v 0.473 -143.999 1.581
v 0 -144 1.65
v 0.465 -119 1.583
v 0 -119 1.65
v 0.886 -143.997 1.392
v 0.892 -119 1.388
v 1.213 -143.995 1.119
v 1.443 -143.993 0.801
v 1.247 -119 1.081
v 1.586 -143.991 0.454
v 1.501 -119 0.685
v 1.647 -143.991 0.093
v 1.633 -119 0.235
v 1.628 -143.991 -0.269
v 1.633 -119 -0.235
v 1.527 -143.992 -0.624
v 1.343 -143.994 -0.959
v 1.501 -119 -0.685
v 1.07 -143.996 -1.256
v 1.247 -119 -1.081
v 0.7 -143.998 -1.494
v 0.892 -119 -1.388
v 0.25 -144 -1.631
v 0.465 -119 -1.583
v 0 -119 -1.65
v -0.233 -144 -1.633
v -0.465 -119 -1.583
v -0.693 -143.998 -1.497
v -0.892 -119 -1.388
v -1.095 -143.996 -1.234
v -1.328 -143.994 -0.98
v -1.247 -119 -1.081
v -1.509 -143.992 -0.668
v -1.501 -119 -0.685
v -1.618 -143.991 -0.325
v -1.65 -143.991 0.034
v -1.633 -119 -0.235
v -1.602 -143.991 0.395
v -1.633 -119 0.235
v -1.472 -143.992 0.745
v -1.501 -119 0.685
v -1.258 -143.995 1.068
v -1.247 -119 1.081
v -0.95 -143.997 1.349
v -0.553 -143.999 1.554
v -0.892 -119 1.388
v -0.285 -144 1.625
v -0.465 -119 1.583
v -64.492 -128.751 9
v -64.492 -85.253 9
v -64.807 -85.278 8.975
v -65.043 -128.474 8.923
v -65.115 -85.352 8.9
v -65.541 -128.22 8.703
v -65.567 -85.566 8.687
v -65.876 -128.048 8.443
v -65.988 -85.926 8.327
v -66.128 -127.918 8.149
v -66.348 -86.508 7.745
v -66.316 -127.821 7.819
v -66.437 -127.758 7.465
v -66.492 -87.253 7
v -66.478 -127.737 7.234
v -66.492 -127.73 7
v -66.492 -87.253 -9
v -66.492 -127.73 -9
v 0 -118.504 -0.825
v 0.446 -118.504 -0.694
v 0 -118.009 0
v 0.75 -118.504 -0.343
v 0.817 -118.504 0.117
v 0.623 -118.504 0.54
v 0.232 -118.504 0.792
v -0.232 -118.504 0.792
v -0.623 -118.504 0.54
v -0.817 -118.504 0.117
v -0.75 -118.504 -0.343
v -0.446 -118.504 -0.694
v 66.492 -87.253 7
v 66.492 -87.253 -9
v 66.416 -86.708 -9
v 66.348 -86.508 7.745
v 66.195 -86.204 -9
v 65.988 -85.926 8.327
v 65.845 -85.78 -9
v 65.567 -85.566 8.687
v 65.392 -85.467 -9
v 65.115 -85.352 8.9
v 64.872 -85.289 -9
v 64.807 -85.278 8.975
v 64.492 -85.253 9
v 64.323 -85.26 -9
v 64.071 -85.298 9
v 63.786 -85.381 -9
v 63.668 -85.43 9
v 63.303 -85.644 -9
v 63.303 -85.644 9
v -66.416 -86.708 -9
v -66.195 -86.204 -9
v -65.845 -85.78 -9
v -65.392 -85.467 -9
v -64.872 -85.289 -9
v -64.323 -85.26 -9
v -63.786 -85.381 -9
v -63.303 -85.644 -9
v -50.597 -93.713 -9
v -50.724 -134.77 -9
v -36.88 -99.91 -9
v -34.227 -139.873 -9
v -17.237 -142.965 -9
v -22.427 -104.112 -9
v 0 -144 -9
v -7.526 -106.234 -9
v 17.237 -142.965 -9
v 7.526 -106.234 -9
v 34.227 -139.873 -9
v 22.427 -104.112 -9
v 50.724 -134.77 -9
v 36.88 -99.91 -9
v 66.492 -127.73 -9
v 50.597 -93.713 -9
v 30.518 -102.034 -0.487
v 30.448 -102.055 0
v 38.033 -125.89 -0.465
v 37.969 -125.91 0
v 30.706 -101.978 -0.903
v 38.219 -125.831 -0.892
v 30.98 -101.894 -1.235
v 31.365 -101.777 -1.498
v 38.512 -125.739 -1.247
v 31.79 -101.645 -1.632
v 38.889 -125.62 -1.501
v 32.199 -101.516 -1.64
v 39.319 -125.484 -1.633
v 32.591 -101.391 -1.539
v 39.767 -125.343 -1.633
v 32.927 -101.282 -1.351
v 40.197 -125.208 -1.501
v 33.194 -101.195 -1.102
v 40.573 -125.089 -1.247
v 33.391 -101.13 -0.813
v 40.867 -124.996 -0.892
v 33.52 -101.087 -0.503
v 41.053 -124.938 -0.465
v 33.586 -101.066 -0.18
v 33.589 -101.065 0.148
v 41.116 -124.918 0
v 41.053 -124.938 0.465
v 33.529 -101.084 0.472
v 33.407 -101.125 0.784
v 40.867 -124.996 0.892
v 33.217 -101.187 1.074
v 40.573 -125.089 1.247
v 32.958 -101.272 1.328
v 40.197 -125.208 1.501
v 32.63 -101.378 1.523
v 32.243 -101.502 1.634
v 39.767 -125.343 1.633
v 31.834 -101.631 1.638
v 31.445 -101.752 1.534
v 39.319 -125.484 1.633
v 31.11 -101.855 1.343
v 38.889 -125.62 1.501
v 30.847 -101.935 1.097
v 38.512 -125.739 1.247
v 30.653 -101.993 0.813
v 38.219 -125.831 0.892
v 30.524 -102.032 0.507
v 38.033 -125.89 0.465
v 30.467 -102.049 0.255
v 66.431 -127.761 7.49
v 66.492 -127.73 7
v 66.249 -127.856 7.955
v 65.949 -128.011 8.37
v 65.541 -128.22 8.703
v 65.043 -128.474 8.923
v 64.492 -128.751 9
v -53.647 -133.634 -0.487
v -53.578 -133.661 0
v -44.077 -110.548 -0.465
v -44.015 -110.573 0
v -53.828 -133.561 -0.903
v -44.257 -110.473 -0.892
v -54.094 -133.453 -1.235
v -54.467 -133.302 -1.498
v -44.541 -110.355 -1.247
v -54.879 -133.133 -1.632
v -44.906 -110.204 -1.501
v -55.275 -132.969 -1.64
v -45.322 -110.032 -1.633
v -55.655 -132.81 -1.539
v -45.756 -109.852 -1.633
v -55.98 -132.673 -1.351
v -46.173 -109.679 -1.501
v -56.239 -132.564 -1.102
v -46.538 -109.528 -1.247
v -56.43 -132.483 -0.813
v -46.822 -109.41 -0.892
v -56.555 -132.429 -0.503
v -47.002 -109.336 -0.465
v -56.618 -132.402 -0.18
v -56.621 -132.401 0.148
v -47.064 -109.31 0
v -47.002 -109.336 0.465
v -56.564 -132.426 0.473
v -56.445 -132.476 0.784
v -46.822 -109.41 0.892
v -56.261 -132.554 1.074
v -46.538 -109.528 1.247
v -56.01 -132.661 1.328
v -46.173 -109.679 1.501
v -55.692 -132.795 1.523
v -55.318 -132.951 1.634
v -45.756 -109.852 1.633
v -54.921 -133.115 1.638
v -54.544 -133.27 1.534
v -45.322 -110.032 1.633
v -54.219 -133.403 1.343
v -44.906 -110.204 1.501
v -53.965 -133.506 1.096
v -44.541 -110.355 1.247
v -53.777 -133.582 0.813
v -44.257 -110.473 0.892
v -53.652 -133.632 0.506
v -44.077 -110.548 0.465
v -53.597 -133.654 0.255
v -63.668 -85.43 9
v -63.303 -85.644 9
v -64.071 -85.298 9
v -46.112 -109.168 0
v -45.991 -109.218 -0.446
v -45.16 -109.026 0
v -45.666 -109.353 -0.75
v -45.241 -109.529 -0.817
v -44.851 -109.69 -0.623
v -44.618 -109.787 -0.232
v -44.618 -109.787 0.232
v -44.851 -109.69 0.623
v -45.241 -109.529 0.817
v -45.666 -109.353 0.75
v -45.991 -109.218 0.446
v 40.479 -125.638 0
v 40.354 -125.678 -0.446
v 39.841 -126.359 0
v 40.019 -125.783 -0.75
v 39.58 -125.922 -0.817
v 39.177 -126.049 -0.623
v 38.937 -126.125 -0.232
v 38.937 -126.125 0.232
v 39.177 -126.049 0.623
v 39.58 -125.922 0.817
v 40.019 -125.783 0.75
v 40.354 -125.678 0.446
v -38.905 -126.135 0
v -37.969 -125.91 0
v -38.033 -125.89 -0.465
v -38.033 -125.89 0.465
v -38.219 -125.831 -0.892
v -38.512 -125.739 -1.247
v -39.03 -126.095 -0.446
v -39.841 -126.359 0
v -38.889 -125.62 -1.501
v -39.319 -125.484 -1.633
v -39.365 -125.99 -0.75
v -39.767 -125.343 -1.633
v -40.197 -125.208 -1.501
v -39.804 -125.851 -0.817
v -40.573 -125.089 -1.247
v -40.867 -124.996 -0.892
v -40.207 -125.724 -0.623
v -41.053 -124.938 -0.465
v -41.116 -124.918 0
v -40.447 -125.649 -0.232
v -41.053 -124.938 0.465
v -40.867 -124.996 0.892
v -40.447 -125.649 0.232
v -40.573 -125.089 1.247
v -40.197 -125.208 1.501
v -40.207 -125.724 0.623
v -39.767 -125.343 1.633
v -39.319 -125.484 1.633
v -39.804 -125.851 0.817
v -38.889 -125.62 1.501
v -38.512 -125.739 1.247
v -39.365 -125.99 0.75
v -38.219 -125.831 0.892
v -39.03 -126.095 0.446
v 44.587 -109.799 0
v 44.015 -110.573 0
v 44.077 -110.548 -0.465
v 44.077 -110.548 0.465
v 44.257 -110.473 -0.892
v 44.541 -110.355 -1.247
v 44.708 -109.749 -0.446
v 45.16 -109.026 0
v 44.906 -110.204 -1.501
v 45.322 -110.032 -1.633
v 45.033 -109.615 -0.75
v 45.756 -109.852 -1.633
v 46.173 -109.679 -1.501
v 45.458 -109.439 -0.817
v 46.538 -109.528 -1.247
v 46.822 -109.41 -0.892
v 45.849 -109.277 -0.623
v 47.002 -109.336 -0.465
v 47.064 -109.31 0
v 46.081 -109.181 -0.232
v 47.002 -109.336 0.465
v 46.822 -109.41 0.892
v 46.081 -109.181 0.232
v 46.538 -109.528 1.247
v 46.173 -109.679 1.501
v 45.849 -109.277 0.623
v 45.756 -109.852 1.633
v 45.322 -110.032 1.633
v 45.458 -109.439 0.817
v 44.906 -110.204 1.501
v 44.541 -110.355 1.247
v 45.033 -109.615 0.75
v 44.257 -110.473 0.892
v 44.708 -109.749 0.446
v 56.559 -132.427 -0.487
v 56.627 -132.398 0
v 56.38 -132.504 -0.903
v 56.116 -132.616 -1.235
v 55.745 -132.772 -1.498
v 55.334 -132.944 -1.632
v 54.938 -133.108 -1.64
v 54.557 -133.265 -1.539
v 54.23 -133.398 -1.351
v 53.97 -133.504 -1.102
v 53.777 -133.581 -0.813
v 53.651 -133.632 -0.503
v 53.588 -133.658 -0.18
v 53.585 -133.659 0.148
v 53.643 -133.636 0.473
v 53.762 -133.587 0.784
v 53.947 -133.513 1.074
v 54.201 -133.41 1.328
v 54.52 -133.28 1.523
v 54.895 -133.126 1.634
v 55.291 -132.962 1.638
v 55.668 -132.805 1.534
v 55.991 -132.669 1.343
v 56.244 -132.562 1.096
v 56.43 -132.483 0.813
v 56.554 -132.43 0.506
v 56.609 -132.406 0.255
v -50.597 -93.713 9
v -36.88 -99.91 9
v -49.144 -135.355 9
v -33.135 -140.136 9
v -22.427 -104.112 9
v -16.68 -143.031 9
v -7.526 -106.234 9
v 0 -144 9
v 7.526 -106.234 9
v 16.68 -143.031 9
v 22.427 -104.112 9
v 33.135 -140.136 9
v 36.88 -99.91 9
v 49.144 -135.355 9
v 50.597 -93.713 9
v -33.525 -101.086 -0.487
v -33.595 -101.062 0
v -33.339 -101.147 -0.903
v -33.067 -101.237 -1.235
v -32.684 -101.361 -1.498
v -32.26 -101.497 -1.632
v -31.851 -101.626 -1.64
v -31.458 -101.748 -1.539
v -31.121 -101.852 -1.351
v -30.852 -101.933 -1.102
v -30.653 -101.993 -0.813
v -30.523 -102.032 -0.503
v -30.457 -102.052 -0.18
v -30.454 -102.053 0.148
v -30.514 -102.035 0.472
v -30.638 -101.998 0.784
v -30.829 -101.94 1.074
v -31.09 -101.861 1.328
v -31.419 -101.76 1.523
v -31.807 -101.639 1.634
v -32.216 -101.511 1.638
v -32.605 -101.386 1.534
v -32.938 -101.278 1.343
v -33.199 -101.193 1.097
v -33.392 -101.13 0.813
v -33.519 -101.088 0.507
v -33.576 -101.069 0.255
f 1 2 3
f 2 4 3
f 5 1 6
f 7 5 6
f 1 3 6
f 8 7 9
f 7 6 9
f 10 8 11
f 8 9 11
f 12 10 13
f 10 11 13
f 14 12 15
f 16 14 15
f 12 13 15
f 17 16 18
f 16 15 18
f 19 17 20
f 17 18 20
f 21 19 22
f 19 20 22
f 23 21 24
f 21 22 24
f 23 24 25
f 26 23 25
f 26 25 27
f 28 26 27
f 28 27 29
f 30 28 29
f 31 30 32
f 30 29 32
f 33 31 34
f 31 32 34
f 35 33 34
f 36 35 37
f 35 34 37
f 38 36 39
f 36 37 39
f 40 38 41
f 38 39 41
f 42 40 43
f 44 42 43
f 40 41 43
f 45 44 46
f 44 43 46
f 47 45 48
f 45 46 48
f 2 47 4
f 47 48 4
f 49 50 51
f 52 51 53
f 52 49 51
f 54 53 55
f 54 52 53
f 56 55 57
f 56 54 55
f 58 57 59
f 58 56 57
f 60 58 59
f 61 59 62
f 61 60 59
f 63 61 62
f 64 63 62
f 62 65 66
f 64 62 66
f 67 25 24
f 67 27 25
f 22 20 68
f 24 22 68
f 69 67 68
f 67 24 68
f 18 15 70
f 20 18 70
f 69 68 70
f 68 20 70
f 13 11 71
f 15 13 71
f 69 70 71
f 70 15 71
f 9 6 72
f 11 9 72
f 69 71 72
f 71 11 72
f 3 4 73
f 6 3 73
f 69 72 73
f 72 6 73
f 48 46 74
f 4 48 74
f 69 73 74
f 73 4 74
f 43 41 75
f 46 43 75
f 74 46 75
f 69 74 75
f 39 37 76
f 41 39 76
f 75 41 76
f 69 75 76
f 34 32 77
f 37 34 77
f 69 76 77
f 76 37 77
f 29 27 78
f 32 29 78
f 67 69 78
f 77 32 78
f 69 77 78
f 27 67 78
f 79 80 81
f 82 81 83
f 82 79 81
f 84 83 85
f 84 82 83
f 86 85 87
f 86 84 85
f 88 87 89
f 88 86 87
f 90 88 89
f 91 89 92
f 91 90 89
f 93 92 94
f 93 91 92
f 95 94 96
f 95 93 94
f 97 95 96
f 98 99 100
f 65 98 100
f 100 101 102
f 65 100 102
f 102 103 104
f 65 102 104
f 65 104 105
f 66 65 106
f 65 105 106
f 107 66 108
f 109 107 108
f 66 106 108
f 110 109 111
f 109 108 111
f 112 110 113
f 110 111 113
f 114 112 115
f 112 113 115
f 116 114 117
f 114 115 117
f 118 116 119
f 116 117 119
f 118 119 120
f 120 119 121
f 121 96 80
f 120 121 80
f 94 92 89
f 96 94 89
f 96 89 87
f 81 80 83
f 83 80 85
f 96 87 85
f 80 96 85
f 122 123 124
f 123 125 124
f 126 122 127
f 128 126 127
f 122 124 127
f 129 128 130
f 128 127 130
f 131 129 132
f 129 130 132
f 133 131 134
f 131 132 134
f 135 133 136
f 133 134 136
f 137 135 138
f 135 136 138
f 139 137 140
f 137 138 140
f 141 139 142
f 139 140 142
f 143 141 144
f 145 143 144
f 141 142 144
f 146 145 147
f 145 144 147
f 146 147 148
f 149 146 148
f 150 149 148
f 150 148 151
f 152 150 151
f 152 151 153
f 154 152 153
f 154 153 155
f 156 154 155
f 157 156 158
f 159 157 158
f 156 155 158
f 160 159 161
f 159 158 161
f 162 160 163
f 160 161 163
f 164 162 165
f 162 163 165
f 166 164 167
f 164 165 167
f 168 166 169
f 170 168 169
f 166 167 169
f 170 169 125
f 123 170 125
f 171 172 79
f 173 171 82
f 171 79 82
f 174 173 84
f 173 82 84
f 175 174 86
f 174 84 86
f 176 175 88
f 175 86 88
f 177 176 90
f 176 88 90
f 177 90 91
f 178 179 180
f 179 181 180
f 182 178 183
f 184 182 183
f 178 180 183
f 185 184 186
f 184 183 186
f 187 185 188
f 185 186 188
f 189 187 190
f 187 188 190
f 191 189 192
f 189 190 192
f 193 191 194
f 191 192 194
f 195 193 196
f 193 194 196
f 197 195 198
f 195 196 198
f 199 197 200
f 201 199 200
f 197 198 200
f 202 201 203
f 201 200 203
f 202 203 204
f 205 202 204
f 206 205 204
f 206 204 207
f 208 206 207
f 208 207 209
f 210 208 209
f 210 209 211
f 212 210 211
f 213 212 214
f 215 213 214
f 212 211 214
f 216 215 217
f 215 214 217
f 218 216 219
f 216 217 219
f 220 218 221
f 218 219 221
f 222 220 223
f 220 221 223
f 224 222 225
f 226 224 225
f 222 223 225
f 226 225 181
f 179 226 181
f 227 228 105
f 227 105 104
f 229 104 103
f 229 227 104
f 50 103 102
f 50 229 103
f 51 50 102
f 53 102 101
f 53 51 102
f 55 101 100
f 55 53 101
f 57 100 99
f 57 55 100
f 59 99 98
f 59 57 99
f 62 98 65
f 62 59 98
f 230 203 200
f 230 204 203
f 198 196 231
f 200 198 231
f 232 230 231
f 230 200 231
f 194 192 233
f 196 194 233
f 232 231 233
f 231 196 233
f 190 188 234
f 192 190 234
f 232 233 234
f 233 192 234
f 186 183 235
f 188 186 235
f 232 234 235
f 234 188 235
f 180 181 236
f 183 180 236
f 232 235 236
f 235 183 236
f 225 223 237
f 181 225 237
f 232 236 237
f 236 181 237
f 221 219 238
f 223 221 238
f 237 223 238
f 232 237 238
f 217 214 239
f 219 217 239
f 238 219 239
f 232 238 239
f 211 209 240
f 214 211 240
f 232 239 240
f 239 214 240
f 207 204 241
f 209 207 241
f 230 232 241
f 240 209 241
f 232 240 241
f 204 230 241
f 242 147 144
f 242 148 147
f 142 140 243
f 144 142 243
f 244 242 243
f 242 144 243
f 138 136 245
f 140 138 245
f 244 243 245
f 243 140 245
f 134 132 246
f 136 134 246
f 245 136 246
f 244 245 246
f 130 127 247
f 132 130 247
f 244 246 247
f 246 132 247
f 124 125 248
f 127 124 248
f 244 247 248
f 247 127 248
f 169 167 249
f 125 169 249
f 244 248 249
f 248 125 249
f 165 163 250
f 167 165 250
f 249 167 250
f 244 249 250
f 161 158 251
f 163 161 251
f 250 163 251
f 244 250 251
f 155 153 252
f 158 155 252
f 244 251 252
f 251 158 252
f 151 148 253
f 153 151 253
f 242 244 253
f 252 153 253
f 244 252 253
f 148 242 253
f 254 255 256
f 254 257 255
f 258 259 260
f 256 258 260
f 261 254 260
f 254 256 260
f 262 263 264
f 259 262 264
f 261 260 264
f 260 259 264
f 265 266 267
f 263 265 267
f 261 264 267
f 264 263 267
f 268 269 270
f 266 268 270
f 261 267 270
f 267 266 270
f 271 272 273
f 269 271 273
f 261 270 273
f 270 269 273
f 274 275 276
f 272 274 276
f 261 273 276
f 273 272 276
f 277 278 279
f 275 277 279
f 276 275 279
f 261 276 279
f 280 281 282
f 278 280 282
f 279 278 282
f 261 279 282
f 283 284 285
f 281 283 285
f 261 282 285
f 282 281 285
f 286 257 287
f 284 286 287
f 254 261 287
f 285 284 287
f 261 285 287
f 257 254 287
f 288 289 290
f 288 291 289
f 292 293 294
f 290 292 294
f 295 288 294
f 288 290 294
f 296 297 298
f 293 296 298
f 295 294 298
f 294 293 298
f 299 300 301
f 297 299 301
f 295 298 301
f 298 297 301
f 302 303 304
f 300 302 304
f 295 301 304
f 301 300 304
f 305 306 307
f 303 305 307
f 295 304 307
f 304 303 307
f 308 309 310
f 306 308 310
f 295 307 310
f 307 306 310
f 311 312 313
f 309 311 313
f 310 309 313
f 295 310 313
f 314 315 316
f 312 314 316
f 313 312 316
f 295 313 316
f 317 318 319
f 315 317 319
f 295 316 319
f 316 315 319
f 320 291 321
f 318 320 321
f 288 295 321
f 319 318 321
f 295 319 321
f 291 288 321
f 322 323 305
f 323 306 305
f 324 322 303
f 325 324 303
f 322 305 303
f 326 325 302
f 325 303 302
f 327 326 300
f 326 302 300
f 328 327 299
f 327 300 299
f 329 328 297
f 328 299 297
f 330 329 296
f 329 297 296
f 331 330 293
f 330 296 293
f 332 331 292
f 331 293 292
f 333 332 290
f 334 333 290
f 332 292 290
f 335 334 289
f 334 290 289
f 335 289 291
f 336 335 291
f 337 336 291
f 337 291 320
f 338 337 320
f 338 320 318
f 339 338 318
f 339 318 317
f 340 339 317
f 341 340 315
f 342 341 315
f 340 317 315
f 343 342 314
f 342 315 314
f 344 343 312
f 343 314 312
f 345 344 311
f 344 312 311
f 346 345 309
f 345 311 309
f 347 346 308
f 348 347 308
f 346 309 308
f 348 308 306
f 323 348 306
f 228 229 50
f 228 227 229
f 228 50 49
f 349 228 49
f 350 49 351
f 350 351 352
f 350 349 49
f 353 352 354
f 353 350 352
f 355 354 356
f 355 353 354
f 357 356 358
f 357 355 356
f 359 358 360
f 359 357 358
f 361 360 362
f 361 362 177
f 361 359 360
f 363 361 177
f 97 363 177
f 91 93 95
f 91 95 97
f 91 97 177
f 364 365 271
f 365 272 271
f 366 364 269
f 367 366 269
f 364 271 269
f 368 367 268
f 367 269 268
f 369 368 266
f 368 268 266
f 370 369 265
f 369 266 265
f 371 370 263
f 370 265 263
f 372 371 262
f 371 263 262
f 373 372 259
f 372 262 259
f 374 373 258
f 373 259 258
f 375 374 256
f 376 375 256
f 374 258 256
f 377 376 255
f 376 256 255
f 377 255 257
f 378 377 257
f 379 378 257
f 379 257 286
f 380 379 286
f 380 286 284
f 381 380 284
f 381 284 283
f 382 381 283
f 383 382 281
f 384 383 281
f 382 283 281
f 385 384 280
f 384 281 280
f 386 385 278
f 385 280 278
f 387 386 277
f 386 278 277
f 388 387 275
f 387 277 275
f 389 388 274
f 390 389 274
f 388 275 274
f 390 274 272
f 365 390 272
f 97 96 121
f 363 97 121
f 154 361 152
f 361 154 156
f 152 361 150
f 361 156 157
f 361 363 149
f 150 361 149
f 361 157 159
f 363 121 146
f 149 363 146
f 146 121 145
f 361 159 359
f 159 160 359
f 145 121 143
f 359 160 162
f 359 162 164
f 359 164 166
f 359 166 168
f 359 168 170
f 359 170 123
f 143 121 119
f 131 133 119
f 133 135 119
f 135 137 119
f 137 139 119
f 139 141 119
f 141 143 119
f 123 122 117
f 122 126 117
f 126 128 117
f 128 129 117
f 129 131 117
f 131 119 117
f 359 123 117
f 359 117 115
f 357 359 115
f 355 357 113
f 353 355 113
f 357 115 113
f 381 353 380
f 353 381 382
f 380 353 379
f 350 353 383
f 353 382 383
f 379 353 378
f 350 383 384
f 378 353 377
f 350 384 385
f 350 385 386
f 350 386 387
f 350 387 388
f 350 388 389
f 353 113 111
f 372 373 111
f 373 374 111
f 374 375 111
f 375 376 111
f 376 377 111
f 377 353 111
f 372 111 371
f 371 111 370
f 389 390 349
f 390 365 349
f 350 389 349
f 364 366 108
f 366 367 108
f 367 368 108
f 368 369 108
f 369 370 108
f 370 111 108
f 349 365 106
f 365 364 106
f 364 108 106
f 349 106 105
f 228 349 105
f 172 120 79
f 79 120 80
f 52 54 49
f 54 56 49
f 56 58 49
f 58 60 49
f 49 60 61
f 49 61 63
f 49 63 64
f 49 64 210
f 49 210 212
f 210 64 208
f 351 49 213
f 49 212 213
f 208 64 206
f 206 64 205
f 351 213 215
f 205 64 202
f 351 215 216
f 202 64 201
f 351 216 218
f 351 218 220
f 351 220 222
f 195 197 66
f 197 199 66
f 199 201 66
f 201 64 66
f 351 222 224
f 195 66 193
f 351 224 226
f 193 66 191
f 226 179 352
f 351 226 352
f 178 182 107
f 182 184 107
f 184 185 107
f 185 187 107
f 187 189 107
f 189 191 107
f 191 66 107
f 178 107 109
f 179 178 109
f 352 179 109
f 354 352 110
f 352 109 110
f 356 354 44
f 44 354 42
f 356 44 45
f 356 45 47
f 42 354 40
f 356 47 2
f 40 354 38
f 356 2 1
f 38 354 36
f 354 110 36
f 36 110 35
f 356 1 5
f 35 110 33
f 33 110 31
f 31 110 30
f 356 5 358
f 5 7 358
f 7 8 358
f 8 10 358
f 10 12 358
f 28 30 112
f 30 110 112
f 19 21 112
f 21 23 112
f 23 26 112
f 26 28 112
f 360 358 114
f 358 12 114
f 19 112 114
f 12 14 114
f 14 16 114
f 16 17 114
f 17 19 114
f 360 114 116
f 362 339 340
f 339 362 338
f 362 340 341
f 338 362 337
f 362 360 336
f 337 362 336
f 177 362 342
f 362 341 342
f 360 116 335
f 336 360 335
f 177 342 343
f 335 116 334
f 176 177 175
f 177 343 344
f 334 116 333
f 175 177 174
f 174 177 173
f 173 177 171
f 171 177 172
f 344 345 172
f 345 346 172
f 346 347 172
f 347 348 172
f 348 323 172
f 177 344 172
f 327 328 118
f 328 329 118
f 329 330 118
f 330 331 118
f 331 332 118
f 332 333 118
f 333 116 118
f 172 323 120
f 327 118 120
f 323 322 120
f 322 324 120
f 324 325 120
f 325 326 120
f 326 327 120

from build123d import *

# Parameters (mm, degrees)
BOSS_EXTRUDE1_DEPTH                   = 9
BOSS_EXTRUDE1_DEPTH_BACK              = 9
TAP_DRILL_FOR_M4_TAP1_D               = 3.3
TAP_DRILL_FOR_M4_TAP1_DEPTH           = 25
TAP_DRILL_FOR_M4_TAP1_TIP             = 0.991420021
TAP_DRILL_FOR_M4_TAP1_ON_FACE_2_D     = 3.3
TAP_DRILL_FOR_M4_TAP1_ON_FACE_2_DEPTH = 25
TAP_DRILL_FOR_M4_TAP1_ON_FACE_2_TIP   = 0.991420021
TAP_DRILL_FOR_M4_TAP1_ON_FACE_3_D     = 3.3
TAP_DRILL_FOR_M4_TAP1_ON_FACE_3_DEPTH = 25
TAP_DRILL_FOR_M4_TAP1_ON_FACE_3_TIP   = 0.991420021
TAP_DRILL_FOR_M4_TAP1_ON_FACE_4_D     = 3.3
TAP_DRILL_FOR_M4_TAP1_ON_FACE_4_DEPTH = 25
TAP_DRILL_FOR_M4_TAP1_ON_FACE_4_TIP   = 0.991420021
TAP_DRILL_FOR_M4_TAP1_ON_FACE_5_D     = 3.3
TAP_DRILL_FOR_M4_TAP1_ON_FACE_5_DEPTH = 25
TAP_DRILL_FOR_M4_TAP1_ON_FACE_5_TIP   = 0.991420021
FILLET2_R                             = 2


with BuildPart() as part:
    # Sketch1 → Boss-Extrude1 (new, two sides: drawn at the far end of the back side and taken through both)
    with BuildSketch(Plane.XY.offset(-BOSS_EXTRUDE1_DEPTH_BACK)):
        with BuildLine():
            Line((66.491800306, -127.729559978), (66.491800306, -83.193091613))
            ThreePointArc((66.491800306, -83.193091613), (0, -106.5), (-66.491800306, -83.193091613))
            Line((-66.491800306, -83.193091613), (-66.491800306, -127.729559978))
            ThreePointArc((-66.491800306, -127.729559978), (0, -144), (66.491800306, -127.729559978))
        make_face()
    extrude(amount=BOSS_EXTRUDE1_DEPTH + BOSS_EXTRUDE1_DEPTH_BACK)

    # Tap Drill for M4 Tap1
    with Locations(Plane(origin=(-32.025167647, -101.570855255, 0), x_dir=(0.953716950748, -0.300705799504, 0), z_dir=(0.300705799504, 0.953716950748, 0))):
        with Locations((0, 0)):
            Hole(TAP_DRILL_FOR_M4_TAP1_D / 2, depth=TAP_DRILL_FOR_M4_TAP1_DEPTH)
            with Locations((0, 0, -(TAP_DRILL_FOR_M4_TAP1_DEPTH + TAP_DRILL_FOR_M4_TAP1_TIP / 2))):  # 118° drill point
                Cone(0, TAP_DRILL_FOR_M4_TAP1_D / 2, TAP_DRILL_FOR_M4_TAP1_TIP, mode=Mode.SUBTRACT)

    # Tap Drill for M4 Tap1 on face 2
    with Locations(Plane(origin=(32.025167647, -101.570855255, 0), x_dir=(0.953716897702, 0.300705967746, 0), z_dir=(-0.300705967746, 0.953716897702, 0))):
        with Locations((0, 0)):
            Hole(TAP_DRILL_FOR_M4_TAP1_ON_FACE_2_D / 2, depth=TAP_DRILL_FOR_M4_TAP1_ON_FACE_2_DEPTH)
            with Locations((0, 0, -(TAP_DRILL_FOR_M4_TAP1_ON_FACE_2_DEPTH + TAP_DRILL_FOR_M4_TAP1_ON_FACE_2_TIP / 2))):  # 118° drill point
                Cone(0, TAP_DRILL_FOR_M4_TAP1_ON_FACE_2_D / 2, TAP_DRILL_FOR_M4_TAP1_ON_FACE_2_TIP, mode=Mode.SUBTRACT)

    # Tap Drill for M4 Tap1 on face 3
    with Locations(Plane(origin=(-55.106414261, -133.038652682, 0), x_dir=(-0.923879753837, 0.382682898036, 0), z_dir=(-0.382682898036, -0.923879753837, 0))):
        with Locations((0, 0)):
            Hole(TAP_DRILL_FOR_M4_TAP1_ON_FACE_3_D / 2, depth=TAP_DRILL_FOR_M4_TAP1_ON_FACE_3_DEPTH)
            with Locations((0, 0, -(TAP_DRILL_FOR_M4_TAP1_ON_FACE_3_DEPTH + TAP_DRILL_FOR_M4_TAP1_ON_FACE_3_TIP / 2))):  # 118° drill point
                Cone(0, TAP_DRILL_FOR_M4_TAP1_ON_FACE_3_D / 2, TAP_DRILL_FOR_M4_TAP1_ON_FACE_3_TIP, mode=Mode.SUBTRACT)

    # Tap Drill for M4 Tap1 on face 4
    with Locations(Plane(origin=(0, -144, 0), x_dir=(0, 0, -1), z_dir=(0, -1, 0))):
        with Locations((0, 0)):
            Hole(TAP_DRILL_FOR_M4_TAP1_ON_FACE_4_D / 2, depth=TAP_DRILL_FOR_M4_TAP1_ON_FACE_4_DEPTH)
            with Locations((0, 0, -(TAP_DRILL_FOR_M4_TAP1_ON_FACE_4_DEPTH + TAP_DRILL_FOR_M4_TAP1_ON_FACE_4_TIP / 2))):  # 118° drill point
                Cone(0, TAP_DRILL_FOR_M4_TAP1_ON_FACE_4_D / 2, TAP_DRILL_FOR_M4_TAP1_ON_FACE_4_TIP, mode=Mode.SUBTRACT)

    # Tap Drill for M4 Tap1 on face 5
    with Locations(Plane(origin=(55.106414261, -133.038652682, 0), x_dir=(-0.923879753837, -0.382682898036, 0), z_dir=(0.382682898036, -0.923879753837, 0))):
        with Locations((0, 0)):
            Hole(TAP_DRILL_FOR_M4_TAP1_ON_FACE_5_D / 2, depth=TAP_DRILL_FOR_M4_TAP1_ON_FACE_5_DEPTH)
            with Locations((0, 0, -(TAP_DRILL_FOR_M4_TAP1_ON_FACE_5_DEPTH + TAP_DRILL_FOR_M4_TAP1_ON_FACE_5_TIP / 2))):  # 118° drill point
                Cone(0, TAP_DRILL_FOR_M4_TAP1_ON_FACE_5_D / 2, TAP_DRILL_FOR_M4_TAP1_ON_FACE_5_TIP, mode=Mode.SUBTRACT)

    # Fillet2
    fillet2_edges = [part.edges().sort_by_distance(p)[0] for p in [
        (-66.491800306, -105.461325795, 9),
        (66.491800306, -105.461325795, 9),
        (66.491800306, -83.193091613, 0),
        (-66.491800306, -83.193091613, 0),
    ]]
    fillet(fillet2_edges, radius=FILLET2_R)


solid = part.part
